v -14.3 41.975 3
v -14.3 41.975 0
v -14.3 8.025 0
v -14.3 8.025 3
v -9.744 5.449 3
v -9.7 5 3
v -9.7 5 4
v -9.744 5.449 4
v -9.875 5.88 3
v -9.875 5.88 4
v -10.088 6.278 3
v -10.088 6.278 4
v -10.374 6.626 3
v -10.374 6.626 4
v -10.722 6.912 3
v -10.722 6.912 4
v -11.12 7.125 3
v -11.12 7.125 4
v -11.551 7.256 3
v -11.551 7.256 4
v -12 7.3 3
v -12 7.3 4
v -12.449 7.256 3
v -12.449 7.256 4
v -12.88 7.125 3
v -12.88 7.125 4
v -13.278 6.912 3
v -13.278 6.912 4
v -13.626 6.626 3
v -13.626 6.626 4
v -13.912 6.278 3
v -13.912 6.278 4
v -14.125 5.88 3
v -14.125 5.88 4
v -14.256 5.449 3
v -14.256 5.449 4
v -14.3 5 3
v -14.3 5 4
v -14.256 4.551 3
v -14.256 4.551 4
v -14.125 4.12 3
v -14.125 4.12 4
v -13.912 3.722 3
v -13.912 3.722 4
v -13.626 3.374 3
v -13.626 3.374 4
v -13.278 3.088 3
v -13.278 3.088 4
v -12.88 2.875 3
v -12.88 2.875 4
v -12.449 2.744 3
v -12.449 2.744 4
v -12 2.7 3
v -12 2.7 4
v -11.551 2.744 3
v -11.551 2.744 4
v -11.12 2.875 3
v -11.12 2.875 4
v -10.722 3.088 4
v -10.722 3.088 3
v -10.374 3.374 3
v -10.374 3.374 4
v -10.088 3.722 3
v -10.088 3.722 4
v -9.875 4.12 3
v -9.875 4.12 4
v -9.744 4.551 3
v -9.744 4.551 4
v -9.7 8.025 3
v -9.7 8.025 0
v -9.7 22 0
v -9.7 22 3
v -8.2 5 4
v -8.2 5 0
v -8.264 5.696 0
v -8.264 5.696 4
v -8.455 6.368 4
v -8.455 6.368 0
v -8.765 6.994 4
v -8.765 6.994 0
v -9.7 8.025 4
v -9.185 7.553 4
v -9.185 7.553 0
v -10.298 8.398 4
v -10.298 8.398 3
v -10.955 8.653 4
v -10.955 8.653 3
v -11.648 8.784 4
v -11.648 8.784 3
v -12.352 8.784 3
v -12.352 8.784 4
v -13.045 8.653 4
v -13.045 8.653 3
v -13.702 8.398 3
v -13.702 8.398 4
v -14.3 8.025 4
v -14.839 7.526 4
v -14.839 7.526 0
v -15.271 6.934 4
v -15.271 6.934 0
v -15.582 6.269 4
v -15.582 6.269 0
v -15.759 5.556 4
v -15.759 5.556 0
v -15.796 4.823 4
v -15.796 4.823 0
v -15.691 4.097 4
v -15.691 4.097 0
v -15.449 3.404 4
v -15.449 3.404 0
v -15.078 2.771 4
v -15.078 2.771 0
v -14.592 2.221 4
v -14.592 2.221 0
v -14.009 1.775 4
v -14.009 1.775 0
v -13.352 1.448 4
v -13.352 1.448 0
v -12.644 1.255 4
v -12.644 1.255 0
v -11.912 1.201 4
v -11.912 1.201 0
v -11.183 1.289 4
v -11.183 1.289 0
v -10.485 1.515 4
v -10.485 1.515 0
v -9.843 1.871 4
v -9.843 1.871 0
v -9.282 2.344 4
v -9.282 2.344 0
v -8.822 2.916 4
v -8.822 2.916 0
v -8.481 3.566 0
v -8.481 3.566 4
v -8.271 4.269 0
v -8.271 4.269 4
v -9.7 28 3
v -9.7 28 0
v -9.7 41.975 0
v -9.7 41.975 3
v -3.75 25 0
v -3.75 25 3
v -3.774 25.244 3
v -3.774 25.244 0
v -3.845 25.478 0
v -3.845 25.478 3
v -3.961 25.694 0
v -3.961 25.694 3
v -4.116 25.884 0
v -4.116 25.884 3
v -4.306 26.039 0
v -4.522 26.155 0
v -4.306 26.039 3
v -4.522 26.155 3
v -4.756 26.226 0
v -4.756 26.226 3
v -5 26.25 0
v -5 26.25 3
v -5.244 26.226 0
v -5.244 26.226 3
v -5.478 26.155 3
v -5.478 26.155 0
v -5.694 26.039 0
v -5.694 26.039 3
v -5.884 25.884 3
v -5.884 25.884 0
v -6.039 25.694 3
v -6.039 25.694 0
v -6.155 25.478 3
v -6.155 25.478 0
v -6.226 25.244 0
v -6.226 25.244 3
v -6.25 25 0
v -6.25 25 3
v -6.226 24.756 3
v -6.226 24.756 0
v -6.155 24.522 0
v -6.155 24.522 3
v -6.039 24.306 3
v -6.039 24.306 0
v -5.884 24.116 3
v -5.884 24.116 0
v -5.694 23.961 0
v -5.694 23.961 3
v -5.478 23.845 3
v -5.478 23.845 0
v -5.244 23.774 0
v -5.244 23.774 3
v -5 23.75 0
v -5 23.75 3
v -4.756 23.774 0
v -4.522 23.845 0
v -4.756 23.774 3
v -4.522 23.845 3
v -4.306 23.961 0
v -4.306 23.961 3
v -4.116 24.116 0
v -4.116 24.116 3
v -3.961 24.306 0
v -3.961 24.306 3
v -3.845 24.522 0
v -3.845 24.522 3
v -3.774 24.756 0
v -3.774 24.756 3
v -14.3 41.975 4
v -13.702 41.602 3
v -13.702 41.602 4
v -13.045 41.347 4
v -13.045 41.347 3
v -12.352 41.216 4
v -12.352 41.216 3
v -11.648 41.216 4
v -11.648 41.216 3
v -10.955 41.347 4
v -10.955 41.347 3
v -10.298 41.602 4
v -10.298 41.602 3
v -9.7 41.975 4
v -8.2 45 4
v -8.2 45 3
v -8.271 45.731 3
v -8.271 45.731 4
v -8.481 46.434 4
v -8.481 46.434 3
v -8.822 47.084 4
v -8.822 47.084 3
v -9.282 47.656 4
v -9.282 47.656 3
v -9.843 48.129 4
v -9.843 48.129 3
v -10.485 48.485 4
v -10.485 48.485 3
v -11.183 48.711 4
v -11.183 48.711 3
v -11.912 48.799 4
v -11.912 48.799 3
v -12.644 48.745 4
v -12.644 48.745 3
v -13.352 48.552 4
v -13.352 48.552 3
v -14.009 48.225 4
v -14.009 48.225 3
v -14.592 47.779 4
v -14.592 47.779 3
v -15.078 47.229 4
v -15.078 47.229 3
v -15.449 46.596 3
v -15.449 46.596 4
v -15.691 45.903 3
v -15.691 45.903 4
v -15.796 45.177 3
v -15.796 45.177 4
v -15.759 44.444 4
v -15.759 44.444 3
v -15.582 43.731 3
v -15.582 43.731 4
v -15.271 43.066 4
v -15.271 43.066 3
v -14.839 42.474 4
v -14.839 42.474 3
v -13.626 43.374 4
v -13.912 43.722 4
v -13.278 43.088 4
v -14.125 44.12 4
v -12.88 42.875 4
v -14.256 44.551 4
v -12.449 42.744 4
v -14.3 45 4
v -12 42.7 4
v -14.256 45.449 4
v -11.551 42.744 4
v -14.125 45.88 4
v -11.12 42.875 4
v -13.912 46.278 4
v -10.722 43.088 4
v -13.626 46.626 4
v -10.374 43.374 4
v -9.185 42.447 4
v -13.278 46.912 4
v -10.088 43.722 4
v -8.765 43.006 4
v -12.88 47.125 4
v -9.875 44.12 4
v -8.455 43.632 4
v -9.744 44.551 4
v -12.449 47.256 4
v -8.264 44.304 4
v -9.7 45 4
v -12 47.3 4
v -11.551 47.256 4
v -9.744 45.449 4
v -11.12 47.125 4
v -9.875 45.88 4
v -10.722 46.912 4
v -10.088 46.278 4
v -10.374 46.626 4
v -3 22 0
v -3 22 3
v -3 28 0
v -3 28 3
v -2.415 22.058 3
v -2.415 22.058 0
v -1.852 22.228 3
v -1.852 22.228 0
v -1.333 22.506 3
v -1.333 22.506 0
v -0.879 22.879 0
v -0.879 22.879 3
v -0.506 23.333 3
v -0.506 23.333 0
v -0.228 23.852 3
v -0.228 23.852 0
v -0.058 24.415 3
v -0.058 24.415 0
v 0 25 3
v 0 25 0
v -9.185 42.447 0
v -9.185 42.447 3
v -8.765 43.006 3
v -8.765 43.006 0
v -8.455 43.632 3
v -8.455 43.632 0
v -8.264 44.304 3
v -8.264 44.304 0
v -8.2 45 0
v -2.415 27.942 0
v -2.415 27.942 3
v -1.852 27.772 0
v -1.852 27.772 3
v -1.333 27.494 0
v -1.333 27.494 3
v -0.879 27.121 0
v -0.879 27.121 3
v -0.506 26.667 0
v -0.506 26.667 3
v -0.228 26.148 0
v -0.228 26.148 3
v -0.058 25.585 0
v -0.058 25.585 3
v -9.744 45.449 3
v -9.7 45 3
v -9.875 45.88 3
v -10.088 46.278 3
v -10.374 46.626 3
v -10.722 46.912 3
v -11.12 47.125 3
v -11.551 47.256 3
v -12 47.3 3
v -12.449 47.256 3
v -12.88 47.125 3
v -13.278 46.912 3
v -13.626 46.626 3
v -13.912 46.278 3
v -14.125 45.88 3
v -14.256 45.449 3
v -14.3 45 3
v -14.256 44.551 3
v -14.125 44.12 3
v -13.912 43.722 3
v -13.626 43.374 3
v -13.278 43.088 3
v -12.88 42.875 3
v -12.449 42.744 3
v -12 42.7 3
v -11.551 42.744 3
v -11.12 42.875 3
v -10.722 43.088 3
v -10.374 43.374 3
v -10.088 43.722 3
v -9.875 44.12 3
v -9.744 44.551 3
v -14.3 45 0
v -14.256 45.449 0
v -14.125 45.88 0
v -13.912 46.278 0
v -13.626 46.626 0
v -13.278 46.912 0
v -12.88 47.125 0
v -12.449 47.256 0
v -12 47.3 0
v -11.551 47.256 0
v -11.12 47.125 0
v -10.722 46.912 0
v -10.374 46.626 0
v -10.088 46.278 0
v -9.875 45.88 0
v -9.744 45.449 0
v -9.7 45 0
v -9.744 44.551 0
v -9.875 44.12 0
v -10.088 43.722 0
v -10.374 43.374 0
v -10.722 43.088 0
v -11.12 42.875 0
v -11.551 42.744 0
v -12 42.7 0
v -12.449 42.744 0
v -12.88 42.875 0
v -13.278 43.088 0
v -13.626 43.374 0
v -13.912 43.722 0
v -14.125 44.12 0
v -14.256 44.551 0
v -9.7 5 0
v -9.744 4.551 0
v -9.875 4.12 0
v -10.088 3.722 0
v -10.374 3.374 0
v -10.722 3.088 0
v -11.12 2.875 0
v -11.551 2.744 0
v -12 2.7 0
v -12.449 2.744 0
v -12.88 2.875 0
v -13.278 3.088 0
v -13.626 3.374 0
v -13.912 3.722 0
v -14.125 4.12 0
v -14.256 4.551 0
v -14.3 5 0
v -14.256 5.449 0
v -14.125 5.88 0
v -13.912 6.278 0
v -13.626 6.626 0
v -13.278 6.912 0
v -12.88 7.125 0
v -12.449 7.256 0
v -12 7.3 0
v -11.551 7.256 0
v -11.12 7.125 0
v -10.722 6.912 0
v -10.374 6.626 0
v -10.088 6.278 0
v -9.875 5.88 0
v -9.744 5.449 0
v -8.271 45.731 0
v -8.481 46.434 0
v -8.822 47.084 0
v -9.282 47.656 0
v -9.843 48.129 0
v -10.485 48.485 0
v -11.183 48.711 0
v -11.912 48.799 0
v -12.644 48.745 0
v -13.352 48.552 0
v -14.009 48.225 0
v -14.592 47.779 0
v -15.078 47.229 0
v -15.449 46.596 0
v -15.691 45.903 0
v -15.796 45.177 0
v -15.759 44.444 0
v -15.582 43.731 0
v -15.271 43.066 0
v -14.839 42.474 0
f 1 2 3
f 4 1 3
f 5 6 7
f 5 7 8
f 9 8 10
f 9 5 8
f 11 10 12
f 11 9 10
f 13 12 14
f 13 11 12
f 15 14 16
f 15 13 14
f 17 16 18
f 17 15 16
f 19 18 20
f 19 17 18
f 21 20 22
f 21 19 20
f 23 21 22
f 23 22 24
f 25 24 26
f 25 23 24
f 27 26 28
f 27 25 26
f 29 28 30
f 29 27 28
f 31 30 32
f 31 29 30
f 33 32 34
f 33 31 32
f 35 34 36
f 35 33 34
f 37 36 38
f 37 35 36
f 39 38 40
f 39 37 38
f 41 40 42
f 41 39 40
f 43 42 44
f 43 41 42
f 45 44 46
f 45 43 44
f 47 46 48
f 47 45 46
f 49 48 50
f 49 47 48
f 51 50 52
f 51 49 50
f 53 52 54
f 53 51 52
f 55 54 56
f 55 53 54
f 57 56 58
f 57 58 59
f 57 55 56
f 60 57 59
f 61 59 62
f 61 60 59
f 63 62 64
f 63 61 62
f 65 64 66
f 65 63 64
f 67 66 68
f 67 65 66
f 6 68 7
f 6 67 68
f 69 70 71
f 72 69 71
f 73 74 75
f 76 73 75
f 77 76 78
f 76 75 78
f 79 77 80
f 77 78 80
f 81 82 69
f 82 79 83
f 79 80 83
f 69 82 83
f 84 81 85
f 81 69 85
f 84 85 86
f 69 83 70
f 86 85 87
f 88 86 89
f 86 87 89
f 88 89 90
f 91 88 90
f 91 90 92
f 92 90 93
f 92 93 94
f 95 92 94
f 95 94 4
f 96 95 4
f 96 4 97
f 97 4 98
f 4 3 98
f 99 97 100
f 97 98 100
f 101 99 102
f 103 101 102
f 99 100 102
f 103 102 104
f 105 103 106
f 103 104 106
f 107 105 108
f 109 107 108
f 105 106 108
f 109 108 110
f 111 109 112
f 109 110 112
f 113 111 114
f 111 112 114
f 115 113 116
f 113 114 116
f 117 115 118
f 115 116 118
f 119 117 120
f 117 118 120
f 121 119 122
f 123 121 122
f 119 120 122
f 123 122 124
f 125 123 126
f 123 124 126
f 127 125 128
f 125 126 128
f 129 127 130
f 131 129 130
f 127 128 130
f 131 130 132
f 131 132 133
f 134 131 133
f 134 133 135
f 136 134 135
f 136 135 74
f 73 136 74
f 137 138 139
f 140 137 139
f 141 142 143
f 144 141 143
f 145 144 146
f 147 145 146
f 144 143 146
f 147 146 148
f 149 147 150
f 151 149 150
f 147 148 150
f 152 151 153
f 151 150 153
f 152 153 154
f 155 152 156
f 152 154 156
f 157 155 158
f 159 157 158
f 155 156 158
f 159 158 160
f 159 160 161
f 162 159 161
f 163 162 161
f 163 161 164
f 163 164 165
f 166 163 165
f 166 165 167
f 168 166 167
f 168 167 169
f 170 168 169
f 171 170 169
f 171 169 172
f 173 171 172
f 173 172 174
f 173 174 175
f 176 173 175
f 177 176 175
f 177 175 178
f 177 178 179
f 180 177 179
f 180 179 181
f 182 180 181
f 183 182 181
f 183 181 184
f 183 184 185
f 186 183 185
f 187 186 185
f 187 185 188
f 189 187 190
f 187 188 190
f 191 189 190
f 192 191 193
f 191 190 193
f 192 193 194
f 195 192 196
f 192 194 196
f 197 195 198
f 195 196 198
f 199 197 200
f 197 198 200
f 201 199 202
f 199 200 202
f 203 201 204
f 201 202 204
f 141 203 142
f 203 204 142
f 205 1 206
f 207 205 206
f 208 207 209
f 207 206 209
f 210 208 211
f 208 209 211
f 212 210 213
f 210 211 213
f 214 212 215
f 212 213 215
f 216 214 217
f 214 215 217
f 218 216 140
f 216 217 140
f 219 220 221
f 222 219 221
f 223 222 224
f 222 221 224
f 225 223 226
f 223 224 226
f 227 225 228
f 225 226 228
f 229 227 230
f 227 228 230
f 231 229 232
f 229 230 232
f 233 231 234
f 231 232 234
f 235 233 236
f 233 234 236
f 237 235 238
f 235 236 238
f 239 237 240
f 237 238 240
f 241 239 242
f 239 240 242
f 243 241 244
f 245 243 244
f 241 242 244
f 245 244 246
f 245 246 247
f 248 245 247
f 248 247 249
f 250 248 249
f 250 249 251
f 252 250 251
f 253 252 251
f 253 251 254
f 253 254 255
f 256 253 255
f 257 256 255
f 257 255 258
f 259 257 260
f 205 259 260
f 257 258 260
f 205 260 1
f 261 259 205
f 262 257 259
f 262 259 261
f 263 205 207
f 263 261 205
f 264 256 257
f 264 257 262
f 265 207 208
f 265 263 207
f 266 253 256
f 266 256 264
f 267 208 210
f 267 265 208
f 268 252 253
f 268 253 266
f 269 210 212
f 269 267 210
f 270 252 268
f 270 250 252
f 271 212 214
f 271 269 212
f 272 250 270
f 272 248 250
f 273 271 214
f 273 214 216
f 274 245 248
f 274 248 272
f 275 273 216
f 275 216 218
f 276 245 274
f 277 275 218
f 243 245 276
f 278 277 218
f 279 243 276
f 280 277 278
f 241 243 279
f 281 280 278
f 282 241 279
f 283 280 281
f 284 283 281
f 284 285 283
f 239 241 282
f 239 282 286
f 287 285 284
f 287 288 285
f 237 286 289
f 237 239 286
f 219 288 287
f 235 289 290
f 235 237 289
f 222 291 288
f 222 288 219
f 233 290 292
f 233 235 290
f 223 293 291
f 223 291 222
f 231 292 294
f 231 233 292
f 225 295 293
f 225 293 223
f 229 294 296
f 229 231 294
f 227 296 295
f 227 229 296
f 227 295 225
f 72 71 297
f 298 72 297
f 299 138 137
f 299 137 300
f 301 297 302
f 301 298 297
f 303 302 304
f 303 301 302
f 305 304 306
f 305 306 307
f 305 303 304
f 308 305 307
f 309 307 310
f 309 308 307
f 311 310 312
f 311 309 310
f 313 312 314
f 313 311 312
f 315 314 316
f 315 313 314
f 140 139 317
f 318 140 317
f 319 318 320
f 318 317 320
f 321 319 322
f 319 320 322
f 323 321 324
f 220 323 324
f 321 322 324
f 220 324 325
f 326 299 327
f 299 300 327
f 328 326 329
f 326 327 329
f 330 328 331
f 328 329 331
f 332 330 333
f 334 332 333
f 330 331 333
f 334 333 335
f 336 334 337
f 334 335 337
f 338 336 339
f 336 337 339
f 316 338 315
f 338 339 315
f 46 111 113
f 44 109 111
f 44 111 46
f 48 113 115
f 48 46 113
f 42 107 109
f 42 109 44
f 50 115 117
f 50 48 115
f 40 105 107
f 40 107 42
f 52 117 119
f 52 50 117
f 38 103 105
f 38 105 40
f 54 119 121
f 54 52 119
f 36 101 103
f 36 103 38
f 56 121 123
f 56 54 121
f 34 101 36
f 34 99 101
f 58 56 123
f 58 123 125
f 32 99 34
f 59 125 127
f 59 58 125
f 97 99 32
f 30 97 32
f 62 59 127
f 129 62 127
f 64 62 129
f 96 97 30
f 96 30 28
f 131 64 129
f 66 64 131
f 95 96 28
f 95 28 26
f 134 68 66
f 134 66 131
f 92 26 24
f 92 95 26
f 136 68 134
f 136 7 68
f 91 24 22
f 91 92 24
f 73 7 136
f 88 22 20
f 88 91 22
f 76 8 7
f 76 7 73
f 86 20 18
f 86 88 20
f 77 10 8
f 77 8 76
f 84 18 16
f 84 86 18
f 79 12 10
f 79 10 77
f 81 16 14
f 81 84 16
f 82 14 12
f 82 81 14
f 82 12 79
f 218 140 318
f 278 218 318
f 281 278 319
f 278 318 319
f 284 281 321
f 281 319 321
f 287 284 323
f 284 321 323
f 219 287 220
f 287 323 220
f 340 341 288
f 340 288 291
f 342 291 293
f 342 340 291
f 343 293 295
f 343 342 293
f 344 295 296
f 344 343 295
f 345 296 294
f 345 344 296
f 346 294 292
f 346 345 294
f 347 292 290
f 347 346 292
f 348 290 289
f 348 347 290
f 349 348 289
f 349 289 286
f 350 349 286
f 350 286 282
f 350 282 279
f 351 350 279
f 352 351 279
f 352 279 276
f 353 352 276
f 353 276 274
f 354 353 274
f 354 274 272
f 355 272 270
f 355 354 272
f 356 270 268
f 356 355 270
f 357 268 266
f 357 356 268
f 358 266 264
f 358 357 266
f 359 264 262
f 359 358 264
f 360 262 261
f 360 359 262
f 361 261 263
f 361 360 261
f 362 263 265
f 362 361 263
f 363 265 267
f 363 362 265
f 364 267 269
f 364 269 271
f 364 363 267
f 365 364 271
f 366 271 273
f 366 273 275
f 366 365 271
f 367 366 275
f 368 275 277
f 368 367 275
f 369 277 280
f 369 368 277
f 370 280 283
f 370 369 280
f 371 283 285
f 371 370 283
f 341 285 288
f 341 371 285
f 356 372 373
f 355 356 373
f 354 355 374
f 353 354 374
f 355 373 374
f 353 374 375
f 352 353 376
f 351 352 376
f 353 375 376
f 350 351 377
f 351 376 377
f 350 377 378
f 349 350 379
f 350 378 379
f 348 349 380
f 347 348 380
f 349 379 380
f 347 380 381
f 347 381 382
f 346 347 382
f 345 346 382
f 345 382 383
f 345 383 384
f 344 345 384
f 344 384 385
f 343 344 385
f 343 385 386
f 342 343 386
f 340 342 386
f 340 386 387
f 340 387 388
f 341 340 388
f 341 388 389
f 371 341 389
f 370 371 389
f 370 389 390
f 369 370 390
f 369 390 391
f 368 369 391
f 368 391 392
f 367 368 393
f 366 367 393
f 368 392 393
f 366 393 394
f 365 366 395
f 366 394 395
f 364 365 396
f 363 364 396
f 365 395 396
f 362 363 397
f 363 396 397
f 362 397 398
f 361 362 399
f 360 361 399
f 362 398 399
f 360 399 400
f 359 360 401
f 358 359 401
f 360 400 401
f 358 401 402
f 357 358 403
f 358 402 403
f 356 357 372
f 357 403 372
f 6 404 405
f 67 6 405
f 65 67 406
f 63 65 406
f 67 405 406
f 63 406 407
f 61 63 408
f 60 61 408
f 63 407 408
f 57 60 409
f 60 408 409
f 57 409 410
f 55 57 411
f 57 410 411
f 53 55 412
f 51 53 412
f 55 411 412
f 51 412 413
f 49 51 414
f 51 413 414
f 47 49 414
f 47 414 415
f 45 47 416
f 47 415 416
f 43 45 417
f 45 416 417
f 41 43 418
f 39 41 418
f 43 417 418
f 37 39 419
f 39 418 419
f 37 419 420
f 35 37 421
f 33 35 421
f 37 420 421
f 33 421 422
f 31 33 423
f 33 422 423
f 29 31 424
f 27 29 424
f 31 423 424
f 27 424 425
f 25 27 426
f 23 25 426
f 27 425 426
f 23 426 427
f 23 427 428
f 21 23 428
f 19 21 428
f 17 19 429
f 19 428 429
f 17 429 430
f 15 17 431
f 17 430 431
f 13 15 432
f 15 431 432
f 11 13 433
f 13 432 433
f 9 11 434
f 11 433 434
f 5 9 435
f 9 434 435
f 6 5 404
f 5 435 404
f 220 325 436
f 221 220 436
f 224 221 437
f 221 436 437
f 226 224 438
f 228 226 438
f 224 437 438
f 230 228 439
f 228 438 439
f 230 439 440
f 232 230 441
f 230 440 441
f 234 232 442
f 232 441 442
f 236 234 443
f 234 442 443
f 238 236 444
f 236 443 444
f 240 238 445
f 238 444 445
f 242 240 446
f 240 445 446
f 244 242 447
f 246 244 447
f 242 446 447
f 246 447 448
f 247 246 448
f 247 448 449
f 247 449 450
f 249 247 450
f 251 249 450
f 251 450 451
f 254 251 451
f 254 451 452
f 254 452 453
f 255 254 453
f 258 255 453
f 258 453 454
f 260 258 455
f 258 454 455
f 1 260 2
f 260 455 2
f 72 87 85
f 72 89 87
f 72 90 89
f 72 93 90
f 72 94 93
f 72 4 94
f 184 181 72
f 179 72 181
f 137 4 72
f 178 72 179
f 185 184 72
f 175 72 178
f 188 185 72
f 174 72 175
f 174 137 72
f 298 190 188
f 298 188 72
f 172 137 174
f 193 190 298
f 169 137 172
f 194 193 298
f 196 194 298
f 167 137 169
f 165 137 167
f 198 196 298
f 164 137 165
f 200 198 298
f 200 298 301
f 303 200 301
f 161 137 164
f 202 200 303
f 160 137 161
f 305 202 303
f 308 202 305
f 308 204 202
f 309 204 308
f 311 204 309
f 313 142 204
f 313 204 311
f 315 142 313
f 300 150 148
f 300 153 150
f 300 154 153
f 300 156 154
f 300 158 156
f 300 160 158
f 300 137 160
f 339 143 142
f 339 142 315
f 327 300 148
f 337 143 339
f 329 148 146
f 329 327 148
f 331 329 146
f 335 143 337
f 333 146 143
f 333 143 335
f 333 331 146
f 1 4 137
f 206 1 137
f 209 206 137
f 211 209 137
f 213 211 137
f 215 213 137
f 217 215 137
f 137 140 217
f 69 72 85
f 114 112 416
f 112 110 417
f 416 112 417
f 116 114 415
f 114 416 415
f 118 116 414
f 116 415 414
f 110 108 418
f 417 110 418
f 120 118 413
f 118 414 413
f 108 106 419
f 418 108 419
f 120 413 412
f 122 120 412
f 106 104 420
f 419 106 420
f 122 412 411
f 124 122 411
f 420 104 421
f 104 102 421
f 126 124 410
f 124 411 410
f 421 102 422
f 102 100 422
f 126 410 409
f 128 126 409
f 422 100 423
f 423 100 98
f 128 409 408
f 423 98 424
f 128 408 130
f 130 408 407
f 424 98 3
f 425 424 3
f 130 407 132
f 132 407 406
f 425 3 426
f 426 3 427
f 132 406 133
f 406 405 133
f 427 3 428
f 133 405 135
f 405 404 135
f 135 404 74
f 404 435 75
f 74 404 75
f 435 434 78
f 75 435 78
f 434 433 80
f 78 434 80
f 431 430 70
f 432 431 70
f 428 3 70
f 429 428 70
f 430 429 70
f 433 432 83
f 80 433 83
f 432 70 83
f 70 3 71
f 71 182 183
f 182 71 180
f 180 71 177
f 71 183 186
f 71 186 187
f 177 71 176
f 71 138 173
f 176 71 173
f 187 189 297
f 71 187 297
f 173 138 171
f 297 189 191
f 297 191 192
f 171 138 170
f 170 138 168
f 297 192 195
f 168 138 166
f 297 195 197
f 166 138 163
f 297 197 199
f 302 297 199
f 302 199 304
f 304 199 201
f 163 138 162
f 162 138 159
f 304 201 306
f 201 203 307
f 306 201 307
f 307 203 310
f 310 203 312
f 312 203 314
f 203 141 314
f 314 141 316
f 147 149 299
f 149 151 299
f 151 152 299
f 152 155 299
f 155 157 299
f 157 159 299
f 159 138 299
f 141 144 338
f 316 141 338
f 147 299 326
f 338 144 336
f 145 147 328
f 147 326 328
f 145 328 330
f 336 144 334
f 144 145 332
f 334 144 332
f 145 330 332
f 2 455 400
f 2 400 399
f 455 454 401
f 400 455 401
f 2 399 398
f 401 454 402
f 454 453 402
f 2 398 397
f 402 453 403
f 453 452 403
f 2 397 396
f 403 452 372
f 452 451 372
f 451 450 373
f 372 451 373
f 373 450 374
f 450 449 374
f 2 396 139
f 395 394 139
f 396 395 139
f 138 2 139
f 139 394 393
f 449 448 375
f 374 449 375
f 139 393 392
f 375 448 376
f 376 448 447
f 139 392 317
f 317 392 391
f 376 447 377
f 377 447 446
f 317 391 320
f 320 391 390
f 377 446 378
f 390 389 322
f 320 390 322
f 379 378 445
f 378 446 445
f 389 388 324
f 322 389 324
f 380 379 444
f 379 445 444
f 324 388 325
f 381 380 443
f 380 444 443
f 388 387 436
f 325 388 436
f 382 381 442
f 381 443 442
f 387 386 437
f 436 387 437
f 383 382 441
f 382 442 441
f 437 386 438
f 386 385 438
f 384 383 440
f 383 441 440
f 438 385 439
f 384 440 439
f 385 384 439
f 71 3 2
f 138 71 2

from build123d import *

# Parameters (mm, degrees)
F0_W     = 9.7
F0_H     = 6
F1_DEPTH = 3
F2_R     = 1.25
F3_DEPTH = 25
F4_R     = 2.99999
F5_R     = 2.3
F6_DEPTH = 1


# Not quite as in the source:
# - a fillet or chamfer is up to 0.001 mm smaller than in the source, because OpenCascade refuses the exact size
# - a feature names something its author has since deleted; it is built from what else it names


with BuildPart() as f1:
    # F0 (on Top) → F1 (new body)
    with BuildSketch(Plane.XY):
        with BuildLine():
            ThreePointArc((-14.3, 5), (-12, 7.3), (-9.7, 5))
            Line((-9.7, 5), (-9.7, 8.0248966925))
            ThreePointArc((-9.7, 8.0248966925), (-12, 8.8), (-14.3, 8.0248966925))
            Line((-14.3, 8.0248966925), (-14.3, 5))
        make_face()
        with BuildLine():
            Line((-9.7, 8.0248966925), (-9.7, 5))
            ThreePointArc((-9.7, 5), (-12, 2.7), (-14.3, 5))
            Line((-14.3, 5), (-14.3, 8.0248966925))
            ThreePointArc((-14.3, 8.0248966925), (-13.6881943016, 1.5955910939), (-8.2, 5))
            ThreePointArc((-8.2, 5), (-8.5955910939, 6.6881943016), (-9.7, 8.0248966925))
        make_face()
        with BuildLine():
            ThreePointArc((-8.2, 45), (-13.6881943016, 48.4044089061), (-14.3, 41.9751033075))
            Line((-14.3, 41.9751033075), (-14.3, 45))
            ThreePointArc((-14.3, 45), (-12, 47.3), (-9.7, 45))
            Line((-9.7, 45), (-9.7, 41.9751033075))
            ThreePointArc((-9.7, 41.9751033075), (-8.5955910939, 43.3118056984), (-8.2, 45))
        make_face()
        with BuildLine():
            Line((-14.3, 45), (-14.3, 41.9751033075))
            ThreePointArc((-14.3, 41.9751033075), (-12, 41.2), (-9.7, 41.9751033075))
            Line((-9.7, 41.9751033075), (-9.7, 45))
            ThreePointArc((-9.7, 45), (-12, 42.7), (-14.3, 45))
        make_face()
        with BuildLine():
            ThreePointArc((-14.3, 8.0248966925), (-12, 8.8), (-9.7, 8.0248966925))
            Line((-9.7, 8.0248966925), (-9.7, 22))
            Line((-9.7, 22), (-9.7, 28))
            Line((-9.7, 28), (-9.7, 41.9751033075))
            ThreePointArc((-9.7, 41.9751033075), (-12, 41.2), (-14.3, 41.9751033075))
            Line((-14.3, 41.9751033075), (-14.3, 8.0248966925))
        make_face()
        with Locations((-4.85, 25)):
            Rectangle(F0_W, F0_H)
        with BuildLine():
            ThreePointArc((-8.2, 45), (-13.6881943016, 48.4044089061), (-14.3, 41.9751033075))
            Line((-14.3, 41.9751033075), (-14.3, 45))
            ThreePointArc((-14.3, 45), (-12, 47.3), (-9.7, 45))
            Line((-9.7, 45), (-9.7, 41.9751033075))
            ThreePointArc((-9.7, 41.9751033075), (-8.5955910939, 43.3118056984), (-8.2, 45))
        make_face()
    extrude(amount=F1_DEPTH)

    # F2 (on face) → F3 (cut)
    with BuildSketch(Plane.XY.offset(3)):
        with Locations((-5, 25)):
            Circle(F2_R)
    extrude(amount=-F3_DEPTH, mode=Mode.SUBTRACT)

    # F4 (radius 3 in the source; OpenCascade refuses exactly that, so slightly less here)
    f4_edges = [f1.edges().sort_by_distance(p)[0] for p in [
        (0, 28, 1.5),
        (0, 22, 1.5),
    ]]
    fillet(f4_edges, radius=F4_R)

    # F5 (on face) → F6 (join)
    with BuildSketch(Plane.XY.offset(3)):
        with BuildLine():
            ThreePointArc((-14.3, 8.0248966925), (-13.6881943016, 1.5955910939), (-8.2, 5))
            ThreePointArc((-8.2, 5), (-8.5955910939, 6.6881943016), (-9.7, 8.0248966925))
            ThreePointArc((-9.7, 8.0248966925), (-12, 8.8), (-14.3, 8.0248966925))
        make_face()
        with Locations((-12, 5)):
            Circle(F5_R, mode=Mode.SUBTRACT)
        with BuildLine():
            ThreePointArc((-8.2, 45), (-13.6881943016, 48.4044089061), (-14.3, 41.9751033075))
            ThreePointArc((-14.3, 41.9751033075), (-12, 41.2), (-9.7, 41.9751033075))
            ThreePointArc((-9.7, 41.9751033075), (-8.5955910939, 43.3118056984), (-8.2, 45))
        make_face()
        with Locations((-12, 45)):
            Circle(F5_R, mode=Mode.SUBTRACT)
    extrude(amount=F6_DEPTH)


solid = f1.part
